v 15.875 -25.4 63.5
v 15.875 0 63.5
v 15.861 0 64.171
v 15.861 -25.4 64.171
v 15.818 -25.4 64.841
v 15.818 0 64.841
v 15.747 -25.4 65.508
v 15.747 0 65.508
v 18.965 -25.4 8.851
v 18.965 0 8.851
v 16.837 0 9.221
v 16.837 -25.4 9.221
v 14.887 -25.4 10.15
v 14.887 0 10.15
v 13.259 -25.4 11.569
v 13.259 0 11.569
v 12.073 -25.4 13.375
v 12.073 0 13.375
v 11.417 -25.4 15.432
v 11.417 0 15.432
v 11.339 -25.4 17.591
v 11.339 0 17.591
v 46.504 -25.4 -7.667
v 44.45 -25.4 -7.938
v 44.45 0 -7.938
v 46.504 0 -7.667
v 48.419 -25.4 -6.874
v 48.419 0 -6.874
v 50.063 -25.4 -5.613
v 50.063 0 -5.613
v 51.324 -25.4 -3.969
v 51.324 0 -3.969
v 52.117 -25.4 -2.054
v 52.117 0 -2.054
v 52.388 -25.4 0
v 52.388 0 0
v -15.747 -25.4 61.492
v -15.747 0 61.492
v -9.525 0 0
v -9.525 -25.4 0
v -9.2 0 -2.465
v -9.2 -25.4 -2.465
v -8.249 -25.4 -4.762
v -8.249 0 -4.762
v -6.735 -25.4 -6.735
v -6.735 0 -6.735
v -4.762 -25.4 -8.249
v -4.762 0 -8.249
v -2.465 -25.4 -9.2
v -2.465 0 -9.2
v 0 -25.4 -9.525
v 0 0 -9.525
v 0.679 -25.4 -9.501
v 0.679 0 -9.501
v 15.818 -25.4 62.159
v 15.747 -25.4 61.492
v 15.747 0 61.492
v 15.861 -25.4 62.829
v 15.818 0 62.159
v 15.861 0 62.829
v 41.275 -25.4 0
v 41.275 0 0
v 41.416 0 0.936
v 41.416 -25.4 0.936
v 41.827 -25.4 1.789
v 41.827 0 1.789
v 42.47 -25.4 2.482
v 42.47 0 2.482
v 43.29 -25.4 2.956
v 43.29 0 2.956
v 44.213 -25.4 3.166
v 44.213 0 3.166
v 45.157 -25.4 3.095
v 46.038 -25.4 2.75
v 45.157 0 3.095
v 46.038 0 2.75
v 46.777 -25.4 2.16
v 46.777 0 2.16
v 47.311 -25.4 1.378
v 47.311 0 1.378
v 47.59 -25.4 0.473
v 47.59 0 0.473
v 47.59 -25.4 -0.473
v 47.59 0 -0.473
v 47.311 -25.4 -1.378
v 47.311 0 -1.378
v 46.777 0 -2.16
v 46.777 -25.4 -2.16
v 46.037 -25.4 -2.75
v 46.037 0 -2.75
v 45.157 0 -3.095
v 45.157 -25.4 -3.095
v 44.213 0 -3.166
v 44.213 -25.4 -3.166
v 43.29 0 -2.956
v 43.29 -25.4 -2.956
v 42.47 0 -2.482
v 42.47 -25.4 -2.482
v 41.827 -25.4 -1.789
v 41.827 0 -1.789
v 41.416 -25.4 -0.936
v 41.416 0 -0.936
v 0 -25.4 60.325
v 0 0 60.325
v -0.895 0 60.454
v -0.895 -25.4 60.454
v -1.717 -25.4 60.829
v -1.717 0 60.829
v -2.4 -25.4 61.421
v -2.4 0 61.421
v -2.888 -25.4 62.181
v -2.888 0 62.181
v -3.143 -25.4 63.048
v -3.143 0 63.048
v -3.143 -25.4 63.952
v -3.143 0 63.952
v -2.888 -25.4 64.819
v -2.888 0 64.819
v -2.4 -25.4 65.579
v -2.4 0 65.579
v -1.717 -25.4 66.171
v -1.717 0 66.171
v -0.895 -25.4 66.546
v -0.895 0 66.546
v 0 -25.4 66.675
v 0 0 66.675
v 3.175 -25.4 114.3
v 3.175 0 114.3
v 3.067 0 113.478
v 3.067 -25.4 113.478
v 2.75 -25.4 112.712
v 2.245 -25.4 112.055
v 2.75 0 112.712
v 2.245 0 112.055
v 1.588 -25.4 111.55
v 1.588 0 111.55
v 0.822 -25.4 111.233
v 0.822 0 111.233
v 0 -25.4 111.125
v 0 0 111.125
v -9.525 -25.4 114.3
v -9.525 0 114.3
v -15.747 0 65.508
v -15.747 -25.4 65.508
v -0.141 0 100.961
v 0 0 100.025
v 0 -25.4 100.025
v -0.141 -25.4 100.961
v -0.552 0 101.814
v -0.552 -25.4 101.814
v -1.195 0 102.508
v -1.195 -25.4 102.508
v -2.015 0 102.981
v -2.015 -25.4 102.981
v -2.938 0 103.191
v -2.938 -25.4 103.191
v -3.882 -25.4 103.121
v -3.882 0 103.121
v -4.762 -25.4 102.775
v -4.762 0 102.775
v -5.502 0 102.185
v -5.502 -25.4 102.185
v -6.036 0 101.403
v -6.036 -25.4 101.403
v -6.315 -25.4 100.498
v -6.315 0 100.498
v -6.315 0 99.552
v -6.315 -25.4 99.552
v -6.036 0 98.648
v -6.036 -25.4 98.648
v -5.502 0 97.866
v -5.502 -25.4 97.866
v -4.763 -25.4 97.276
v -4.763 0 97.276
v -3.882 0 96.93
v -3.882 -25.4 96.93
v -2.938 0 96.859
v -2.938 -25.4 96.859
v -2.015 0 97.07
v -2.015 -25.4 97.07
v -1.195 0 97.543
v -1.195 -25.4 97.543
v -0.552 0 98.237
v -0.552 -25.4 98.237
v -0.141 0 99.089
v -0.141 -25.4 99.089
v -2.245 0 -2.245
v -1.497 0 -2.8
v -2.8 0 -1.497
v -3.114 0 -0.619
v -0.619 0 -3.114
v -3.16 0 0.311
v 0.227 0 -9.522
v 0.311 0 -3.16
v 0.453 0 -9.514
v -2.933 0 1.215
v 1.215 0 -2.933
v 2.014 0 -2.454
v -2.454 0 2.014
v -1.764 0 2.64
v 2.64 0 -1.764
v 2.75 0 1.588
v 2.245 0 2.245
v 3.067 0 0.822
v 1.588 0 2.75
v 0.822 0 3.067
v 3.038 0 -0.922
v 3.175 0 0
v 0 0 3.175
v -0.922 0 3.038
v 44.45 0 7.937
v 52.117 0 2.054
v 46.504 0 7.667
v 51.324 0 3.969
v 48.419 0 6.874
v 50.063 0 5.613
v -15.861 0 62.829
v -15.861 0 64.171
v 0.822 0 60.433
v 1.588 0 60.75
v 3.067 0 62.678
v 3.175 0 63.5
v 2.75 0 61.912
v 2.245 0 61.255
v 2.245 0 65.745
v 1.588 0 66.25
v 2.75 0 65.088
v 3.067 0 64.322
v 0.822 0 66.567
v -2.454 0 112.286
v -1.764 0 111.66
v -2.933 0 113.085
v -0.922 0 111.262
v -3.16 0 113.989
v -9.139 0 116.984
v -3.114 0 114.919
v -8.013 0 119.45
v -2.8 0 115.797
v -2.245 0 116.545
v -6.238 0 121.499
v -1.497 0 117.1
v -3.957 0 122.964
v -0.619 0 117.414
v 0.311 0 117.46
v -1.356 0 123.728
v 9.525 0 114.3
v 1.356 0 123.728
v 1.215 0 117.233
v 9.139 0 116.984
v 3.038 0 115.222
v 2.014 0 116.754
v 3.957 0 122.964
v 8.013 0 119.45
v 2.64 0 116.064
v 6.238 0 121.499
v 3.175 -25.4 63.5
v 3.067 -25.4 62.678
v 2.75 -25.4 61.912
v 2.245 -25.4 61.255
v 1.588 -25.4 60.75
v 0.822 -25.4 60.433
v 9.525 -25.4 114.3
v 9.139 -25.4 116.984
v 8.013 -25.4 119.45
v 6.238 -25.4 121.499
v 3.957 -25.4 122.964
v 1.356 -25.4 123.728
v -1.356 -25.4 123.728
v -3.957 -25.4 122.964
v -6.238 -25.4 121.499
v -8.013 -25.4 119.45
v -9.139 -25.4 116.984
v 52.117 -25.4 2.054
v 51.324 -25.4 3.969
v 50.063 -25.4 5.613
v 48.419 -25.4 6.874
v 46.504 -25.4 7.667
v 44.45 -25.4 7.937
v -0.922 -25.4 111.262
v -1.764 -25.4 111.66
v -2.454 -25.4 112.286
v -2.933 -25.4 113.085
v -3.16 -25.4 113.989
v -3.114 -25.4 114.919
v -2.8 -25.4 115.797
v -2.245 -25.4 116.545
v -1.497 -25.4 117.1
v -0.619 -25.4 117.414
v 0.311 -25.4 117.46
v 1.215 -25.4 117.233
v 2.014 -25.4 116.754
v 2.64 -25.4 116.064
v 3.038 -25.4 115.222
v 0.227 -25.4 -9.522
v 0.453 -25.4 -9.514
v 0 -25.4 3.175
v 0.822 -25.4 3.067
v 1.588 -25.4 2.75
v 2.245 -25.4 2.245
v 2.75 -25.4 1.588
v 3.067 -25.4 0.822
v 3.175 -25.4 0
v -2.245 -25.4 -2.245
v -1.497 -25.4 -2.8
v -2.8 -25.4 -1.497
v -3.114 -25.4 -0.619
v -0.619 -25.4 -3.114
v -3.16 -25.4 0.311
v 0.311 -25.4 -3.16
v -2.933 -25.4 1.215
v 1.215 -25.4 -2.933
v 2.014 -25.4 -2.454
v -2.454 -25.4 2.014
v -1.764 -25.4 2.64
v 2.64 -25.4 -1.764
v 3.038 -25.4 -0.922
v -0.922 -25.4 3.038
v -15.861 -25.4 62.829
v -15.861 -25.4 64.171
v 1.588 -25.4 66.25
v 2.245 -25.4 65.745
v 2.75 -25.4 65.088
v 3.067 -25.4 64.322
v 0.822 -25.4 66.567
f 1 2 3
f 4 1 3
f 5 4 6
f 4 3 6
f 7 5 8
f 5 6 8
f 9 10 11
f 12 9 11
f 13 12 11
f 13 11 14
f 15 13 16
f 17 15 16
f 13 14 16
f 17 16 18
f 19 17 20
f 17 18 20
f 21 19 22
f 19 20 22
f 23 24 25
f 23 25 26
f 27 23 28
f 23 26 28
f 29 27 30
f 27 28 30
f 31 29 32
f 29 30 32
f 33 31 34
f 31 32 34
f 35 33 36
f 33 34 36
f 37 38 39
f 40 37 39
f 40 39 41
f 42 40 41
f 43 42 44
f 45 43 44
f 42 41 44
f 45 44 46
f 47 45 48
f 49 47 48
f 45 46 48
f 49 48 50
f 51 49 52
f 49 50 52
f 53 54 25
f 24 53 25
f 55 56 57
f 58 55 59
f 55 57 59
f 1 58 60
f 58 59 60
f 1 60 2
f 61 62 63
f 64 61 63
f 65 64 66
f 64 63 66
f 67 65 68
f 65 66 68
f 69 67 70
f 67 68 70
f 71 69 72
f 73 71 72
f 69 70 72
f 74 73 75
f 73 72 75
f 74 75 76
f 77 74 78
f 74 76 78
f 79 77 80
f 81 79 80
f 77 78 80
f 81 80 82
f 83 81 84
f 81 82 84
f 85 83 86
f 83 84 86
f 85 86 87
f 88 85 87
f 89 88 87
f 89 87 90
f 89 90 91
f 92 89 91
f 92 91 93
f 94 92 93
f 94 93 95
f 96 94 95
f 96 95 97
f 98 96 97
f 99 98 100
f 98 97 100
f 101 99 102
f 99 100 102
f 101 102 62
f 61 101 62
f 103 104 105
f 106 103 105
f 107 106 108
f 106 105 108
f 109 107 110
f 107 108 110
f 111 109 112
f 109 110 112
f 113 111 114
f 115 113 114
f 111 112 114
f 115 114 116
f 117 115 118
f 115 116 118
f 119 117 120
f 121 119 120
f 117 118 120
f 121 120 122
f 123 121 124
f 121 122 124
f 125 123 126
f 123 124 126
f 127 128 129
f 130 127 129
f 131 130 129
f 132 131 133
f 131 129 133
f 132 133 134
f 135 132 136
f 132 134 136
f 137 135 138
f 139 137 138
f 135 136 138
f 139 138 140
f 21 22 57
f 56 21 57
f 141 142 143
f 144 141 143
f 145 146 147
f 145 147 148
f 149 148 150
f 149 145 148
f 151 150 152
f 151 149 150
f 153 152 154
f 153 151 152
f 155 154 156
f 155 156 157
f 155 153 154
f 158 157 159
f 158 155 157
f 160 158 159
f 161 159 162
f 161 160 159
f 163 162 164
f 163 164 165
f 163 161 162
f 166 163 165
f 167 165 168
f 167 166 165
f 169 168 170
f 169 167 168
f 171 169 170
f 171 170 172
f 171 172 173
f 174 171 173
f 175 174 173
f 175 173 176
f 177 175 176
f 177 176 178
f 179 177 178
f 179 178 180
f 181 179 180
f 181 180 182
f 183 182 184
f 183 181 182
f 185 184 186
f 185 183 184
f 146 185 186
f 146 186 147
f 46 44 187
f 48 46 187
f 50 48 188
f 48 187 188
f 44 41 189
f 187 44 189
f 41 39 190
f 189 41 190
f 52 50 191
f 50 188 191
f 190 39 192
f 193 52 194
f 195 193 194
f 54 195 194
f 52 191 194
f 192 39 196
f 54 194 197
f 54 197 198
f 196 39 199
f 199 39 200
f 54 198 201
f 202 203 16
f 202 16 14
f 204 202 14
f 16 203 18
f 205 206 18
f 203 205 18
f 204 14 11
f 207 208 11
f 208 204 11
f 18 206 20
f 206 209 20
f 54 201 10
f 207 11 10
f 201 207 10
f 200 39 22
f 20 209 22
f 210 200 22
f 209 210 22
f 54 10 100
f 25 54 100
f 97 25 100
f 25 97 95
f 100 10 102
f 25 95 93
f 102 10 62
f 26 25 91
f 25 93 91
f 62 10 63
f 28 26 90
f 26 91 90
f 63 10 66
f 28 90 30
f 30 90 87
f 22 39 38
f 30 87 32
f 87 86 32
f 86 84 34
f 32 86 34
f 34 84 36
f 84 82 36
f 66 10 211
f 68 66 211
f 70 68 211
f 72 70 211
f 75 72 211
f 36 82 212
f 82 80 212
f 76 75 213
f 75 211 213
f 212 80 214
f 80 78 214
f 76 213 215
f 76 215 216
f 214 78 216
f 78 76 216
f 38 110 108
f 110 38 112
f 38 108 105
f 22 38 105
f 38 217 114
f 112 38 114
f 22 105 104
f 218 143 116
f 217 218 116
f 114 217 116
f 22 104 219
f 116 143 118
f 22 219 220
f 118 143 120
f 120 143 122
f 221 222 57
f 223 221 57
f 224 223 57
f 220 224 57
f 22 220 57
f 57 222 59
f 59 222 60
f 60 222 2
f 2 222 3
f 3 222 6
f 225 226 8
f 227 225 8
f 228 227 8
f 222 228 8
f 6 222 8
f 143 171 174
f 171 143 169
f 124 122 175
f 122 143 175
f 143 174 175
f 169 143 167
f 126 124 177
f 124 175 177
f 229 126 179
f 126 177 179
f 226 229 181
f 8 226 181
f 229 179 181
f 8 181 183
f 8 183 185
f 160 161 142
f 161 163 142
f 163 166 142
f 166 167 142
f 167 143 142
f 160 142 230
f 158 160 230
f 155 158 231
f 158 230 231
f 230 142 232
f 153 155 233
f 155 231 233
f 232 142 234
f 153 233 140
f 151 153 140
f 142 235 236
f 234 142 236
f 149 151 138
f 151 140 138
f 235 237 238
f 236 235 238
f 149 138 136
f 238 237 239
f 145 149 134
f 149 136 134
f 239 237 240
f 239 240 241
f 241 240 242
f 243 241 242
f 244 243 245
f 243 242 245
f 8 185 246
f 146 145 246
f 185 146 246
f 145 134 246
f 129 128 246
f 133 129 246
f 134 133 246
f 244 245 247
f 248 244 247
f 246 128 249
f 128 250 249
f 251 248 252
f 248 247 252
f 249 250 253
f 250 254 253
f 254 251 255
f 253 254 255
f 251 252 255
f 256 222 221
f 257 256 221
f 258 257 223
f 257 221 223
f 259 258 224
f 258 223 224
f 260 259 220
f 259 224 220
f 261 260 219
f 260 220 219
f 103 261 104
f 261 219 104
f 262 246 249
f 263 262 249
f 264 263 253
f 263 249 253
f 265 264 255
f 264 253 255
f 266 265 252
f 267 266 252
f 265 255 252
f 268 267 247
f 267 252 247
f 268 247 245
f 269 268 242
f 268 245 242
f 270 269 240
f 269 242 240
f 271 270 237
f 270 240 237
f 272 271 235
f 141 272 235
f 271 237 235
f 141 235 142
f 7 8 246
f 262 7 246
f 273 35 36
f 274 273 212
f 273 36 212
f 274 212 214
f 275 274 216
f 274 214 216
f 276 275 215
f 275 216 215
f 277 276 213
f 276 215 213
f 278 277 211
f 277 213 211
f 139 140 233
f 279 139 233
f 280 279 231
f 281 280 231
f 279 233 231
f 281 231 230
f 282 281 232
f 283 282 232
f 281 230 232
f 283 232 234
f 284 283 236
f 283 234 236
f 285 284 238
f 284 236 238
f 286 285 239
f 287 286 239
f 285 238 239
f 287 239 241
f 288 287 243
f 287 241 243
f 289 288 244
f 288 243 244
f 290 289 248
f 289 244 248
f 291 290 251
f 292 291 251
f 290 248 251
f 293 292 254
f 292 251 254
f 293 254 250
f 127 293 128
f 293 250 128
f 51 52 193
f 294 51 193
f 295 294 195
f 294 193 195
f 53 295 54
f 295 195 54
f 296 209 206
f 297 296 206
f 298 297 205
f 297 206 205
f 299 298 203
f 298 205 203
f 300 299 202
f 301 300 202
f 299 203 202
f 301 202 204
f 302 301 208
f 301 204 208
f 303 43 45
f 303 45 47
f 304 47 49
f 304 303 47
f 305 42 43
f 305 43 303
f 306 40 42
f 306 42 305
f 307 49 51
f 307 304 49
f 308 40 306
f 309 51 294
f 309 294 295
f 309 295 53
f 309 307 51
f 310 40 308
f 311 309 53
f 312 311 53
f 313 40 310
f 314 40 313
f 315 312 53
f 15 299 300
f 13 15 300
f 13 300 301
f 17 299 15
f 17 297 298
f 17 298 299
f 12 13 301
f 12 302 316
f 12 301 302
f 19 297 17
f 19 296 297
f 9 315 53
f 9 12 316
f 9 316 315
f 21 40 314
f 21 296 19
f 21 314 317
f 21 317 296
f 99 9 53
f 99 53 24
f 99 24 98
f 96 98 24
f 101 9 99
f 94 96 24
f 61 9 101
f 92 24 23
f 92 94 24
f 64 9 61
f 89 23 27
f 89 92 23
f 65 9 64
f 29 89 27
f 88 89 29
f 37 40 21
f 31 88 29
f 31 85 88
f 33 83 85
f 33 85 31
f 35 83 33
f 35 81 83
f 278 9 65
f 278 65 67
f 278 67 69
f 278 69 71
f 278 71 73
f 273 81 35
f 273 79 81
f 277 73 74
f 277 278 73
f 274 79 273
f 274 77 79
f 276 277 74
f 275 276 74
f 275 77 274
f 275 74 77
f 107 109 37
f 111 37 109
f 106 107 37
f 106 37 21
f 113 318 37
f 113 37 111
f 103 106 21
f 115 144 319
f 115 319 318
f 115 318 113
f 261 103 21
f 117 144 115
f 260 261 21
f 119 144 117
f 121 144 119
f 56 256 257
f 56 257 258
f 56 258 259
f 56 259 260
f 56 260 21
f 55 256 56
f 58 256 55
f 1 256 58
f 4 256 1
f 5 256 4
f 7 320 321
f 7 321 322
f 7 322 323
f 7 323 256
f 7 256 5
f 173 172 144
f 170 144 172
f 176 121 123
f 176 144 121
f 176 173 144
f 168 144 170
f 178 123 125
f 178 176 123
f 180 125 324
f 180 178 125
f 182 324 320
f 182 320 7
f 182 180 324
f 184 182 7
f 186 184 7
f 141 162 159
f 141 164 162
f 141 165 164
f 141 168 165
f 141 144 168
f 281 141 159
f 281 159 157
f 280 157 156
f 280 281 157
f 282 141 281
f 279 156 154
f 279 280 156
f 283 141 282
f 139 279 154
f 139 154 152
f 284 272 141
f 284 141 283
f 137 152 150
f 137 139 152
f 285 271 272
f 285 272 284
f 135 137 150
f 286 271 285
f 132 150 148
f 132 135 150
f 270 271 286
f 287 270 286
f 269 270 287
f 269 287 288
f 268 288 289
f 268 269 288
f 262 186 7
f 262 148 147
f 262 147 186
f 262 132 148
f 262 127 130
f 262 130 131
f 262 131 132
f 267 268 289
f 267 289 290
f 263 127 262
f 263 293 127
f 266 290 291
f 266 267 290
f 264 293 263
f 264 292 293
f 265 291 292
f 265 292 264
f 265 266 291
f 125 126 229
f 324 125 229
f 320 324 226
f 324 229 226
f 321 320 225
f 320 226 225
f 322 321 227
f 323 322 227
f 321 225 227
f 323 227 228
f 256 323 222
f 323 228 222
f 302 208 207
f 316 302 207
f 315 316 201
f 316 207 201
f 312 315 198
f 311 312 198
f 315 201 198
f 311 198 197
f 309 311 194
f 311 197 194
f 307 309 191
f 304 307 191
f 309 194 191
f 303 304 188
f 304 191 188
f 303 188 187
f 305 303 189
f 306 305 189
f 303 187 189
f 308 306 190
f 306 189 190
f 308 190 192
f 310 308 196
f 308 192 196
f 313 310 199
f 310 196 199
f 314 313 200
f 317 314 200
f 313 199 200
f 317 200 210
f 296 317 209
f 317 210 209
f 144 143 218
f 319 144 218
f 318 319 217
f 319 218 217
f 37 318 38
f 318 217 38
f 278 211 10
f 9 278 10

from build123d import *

# Parameters (mm, degrees)
F0_R     = 3.175
F1_DEPTH = 25.4


with BuildPart() as f1:
    # F0 (on Front) → F1 (new body)
    with BuildSketch(Plane.XZ):
        with BuildLine():
            ThreePointArc((0, 9.525), (-6.7351920908, 6.7351920908), (-9.525, 0))
            ThreePointArc((-9.525, 0), (-6.7351920908, -6.7351920908), (0, -9.525))
            Line((0, -9.525), (0.6794904459, -9.5007324841))
            ThreePointArc((0.6794904459, -9.5007324841), (6.9712901065, -6.4905114784), (9.525, 0))
            Line((9.525, 0), (3.175, 0))
            ThreePointArc((3.175, 0), (-2.2450640303, -2.2450640303), (0, 3.175))
            Line((0, 3.175), (0, 9.525))
        make_face()
        with BuildLine():
            Line((-15.7474569047, 61.4917106696), (-9.525, 0))
            ThreePointArc((-9.525, 0), (-6.7351920908, 6.7351920908), (0, 9.525))
            Line((0, 9.525), (0, 47.625))
            ThreePointArc((0, 47.625), (-10.4912828548, 51.5857812233), (-15.7474569047, 61.4917106696))
        make_face()
        with BuildLine():
            Line((0.6794904459, -9.5007324841), (0, -9.525))
            ThreePointArc((0, -9.525), (0.3399618281, -9.5189311877), (0.6794904459, -9.5007324841))
        make_face()
        with BuildLine():
            Line((0, 47.625), (0, 9.525))
            ThreePointArc((0, 9.525), (6.7351920908, 6.7351920908), (9.525, 0))
            Line((9.525, 0), (36.5125, 0))
            ThreePointArc((36.5125, 0), (38.8373399243, 5.6126600757), (44.45, 7.9375))
            Line((44.45, 7.9375), (18.9647942191, 8.8511945514))
            ThreePointArc((18.9647942191, 8.8511945514), (13.2592410586, 11.5693613748), (11.3392208, 17.5905979549))
            Line((11.3392208, 17.5905979549), (15.7474569047, 61.4917106696))
            ThreePointArc((15.7474569047, 61.4917106696), (10.4912828548, 51.5857812233), (0, 47.625))
        make_face()
        with BuildLine():
            ThreePointArc((-15.7474569047, 65.5082893304), (-15.875, 63.5), (-15.7474569047, 61.4917106696))
            ThreePointArc((-15.7474569047, 61.4917106696), (-10.4912828548, 51.5857812233), (0, 47.625))
            Line((0, 47.625), (0, 60.325))
            ThreePointArc((0, 60.325), (-3.175, 63.5), (0, 66.675))
            Line((0, 66.675), (0, 79.375))
            ThreePointArc((0, 79.375), (-10.4912828548, 75.4142187767), (-15.7474569047, 65.5082893304))
        make_face()
        with BuildLine():
            ThreePointArc((9.525, 0), (6.9712901065, -6.4905114784), (0.6794904459, -9.5007324841))
            Line((0.6794904459, -9.5007324841), (44.45, -7.9375))
            ThreePointArc((44.45, -7.9375), (38.8373399243, -5.6126600757), (36.5125, 0))
            Line((36.5125, 0), (9.525, 0))
        make_face()
        with BuildLine():
            Line((0, 60.325), (0, 47.625))
            ThreePointArc((0, 47.625), (10.4912828548, 51.5857812233), (15.7474569047, 61.4917106696))
            ThreePointArc((15.7474569047, 61.4917106696), (15.8430821396, 62.4938323604), (15.875, 63.5))
            ThreePointArc((15.875, 63.5), (15.8430821396, 64.5061676396), (15.7474569047, 65.5082893304))
            ThreePointArc((15.7474569047, 65.5082893304), (10.4912828548, 75.4142187767), (0, 79.375))
            Line((0, 79.375), (0, 66.675))
            ThreePointArc((0, 66.675), (2.2450640303, 65.7450640303), (3.175, 63.5))
            ThreePointArc((3.175, 63.5), (2.2450640303, 61.2549359697), (0, 60.325))
        make_face()
        with BuildLine():
            Line((-9.525, 114.3), (-15.7474569047, 65.5082893304))
            ThreePointArc((-15.7474569047, 65.5082893304), (-10.4912828548, 75.4142187767), (0, 79.375))
            Line((0, 79.375), (0, 100.0252))
            Line((0, 100.0252), (0, 104.775))
            ThreePointArc((0, 104.775), (-6.7351920908, 107.5648079092), (-9.525, 114.3))
        make_face()
        with Locations((-3.175, 100.0252)):
            Circle(F0_R, mode=Mode.SUBTRACT)
        with BuildLine():
            ThreePointArc((36.5125, 0), (38.8373399243, -5.6126600757), (44.45, -7.9375))
            ThreePointArc((44.45, -7.9375), (50.0626600757, -5.6126600757), (52.3875, 0))
            ThreePointArc((52.3875, 0), (50.0626600757, 5.6126600757), (44.45, 7.9375))
            ThreePointArc((44.45, 7.9375), (38.8373399243, 5.6126600757), (36.5125, 0))
        make_face()
        with BuildLine():
            ThreePointArc((47.625, 0), (44.45, -3.175), (41.275, 0))
            ThreePointArc((41.275, 0), (44.45, 3.175), (47.625, 0))
        make_face(mode=Mode.SUBTRACT)
        with BuildLine():
            Line((0, 100.0252), (0, 79.375))
            ThreePointArc((0, 79.375), (10.4912828548, 75.4142187767), (15.7474569047, 65.5082893304))
            Line((15.7474569047, 65.5082893304), (9.525, 114.3))
            ThreePointArc((9.525, 114.3), (6.7351920908, 107.5648079092), (0, 104.775))
            Line((0, 104.775), (0, 100.0252))
        make_face()
        with BuildLine():
            ThreePointArc((9.525, 114.3), (0, 123.825), (-9.525, 114.3))
            ThreePointArc((-9.525, 114.3), (-6.7351920908, 107.5648079092), (0, 104.775))
            ThreePointArc((0, 104.775), (6.7351920908, 107.5648079092), (9.525, 114.3))
        make_face()
        with BuildLine():
            ThreePointArc((3.175, 114.3), (2.2450640303, 112.0549359697), (0, 111.125))
            ThreePointArc((0, 111.125), (-2.2450640303, 116.5450640303), (3.175, 114.3))
        make_face(mode=Mode.SUBTRACT)
        with BuildLine():
            ThreePointArc((9.525, 0), (6.7351920908, 6.7351920908), (0, 9.525))
            Line((0, 9.525), (0, 3.175))
            ThreePointArc((0, 3.175), (2.2450640303, 2.2450640303), (3.175, 0))
            Line((3.175, 0), (9.525, 0))
        make_face()
    extrude(amount=F1_DEPTH)


solid = f1.part
